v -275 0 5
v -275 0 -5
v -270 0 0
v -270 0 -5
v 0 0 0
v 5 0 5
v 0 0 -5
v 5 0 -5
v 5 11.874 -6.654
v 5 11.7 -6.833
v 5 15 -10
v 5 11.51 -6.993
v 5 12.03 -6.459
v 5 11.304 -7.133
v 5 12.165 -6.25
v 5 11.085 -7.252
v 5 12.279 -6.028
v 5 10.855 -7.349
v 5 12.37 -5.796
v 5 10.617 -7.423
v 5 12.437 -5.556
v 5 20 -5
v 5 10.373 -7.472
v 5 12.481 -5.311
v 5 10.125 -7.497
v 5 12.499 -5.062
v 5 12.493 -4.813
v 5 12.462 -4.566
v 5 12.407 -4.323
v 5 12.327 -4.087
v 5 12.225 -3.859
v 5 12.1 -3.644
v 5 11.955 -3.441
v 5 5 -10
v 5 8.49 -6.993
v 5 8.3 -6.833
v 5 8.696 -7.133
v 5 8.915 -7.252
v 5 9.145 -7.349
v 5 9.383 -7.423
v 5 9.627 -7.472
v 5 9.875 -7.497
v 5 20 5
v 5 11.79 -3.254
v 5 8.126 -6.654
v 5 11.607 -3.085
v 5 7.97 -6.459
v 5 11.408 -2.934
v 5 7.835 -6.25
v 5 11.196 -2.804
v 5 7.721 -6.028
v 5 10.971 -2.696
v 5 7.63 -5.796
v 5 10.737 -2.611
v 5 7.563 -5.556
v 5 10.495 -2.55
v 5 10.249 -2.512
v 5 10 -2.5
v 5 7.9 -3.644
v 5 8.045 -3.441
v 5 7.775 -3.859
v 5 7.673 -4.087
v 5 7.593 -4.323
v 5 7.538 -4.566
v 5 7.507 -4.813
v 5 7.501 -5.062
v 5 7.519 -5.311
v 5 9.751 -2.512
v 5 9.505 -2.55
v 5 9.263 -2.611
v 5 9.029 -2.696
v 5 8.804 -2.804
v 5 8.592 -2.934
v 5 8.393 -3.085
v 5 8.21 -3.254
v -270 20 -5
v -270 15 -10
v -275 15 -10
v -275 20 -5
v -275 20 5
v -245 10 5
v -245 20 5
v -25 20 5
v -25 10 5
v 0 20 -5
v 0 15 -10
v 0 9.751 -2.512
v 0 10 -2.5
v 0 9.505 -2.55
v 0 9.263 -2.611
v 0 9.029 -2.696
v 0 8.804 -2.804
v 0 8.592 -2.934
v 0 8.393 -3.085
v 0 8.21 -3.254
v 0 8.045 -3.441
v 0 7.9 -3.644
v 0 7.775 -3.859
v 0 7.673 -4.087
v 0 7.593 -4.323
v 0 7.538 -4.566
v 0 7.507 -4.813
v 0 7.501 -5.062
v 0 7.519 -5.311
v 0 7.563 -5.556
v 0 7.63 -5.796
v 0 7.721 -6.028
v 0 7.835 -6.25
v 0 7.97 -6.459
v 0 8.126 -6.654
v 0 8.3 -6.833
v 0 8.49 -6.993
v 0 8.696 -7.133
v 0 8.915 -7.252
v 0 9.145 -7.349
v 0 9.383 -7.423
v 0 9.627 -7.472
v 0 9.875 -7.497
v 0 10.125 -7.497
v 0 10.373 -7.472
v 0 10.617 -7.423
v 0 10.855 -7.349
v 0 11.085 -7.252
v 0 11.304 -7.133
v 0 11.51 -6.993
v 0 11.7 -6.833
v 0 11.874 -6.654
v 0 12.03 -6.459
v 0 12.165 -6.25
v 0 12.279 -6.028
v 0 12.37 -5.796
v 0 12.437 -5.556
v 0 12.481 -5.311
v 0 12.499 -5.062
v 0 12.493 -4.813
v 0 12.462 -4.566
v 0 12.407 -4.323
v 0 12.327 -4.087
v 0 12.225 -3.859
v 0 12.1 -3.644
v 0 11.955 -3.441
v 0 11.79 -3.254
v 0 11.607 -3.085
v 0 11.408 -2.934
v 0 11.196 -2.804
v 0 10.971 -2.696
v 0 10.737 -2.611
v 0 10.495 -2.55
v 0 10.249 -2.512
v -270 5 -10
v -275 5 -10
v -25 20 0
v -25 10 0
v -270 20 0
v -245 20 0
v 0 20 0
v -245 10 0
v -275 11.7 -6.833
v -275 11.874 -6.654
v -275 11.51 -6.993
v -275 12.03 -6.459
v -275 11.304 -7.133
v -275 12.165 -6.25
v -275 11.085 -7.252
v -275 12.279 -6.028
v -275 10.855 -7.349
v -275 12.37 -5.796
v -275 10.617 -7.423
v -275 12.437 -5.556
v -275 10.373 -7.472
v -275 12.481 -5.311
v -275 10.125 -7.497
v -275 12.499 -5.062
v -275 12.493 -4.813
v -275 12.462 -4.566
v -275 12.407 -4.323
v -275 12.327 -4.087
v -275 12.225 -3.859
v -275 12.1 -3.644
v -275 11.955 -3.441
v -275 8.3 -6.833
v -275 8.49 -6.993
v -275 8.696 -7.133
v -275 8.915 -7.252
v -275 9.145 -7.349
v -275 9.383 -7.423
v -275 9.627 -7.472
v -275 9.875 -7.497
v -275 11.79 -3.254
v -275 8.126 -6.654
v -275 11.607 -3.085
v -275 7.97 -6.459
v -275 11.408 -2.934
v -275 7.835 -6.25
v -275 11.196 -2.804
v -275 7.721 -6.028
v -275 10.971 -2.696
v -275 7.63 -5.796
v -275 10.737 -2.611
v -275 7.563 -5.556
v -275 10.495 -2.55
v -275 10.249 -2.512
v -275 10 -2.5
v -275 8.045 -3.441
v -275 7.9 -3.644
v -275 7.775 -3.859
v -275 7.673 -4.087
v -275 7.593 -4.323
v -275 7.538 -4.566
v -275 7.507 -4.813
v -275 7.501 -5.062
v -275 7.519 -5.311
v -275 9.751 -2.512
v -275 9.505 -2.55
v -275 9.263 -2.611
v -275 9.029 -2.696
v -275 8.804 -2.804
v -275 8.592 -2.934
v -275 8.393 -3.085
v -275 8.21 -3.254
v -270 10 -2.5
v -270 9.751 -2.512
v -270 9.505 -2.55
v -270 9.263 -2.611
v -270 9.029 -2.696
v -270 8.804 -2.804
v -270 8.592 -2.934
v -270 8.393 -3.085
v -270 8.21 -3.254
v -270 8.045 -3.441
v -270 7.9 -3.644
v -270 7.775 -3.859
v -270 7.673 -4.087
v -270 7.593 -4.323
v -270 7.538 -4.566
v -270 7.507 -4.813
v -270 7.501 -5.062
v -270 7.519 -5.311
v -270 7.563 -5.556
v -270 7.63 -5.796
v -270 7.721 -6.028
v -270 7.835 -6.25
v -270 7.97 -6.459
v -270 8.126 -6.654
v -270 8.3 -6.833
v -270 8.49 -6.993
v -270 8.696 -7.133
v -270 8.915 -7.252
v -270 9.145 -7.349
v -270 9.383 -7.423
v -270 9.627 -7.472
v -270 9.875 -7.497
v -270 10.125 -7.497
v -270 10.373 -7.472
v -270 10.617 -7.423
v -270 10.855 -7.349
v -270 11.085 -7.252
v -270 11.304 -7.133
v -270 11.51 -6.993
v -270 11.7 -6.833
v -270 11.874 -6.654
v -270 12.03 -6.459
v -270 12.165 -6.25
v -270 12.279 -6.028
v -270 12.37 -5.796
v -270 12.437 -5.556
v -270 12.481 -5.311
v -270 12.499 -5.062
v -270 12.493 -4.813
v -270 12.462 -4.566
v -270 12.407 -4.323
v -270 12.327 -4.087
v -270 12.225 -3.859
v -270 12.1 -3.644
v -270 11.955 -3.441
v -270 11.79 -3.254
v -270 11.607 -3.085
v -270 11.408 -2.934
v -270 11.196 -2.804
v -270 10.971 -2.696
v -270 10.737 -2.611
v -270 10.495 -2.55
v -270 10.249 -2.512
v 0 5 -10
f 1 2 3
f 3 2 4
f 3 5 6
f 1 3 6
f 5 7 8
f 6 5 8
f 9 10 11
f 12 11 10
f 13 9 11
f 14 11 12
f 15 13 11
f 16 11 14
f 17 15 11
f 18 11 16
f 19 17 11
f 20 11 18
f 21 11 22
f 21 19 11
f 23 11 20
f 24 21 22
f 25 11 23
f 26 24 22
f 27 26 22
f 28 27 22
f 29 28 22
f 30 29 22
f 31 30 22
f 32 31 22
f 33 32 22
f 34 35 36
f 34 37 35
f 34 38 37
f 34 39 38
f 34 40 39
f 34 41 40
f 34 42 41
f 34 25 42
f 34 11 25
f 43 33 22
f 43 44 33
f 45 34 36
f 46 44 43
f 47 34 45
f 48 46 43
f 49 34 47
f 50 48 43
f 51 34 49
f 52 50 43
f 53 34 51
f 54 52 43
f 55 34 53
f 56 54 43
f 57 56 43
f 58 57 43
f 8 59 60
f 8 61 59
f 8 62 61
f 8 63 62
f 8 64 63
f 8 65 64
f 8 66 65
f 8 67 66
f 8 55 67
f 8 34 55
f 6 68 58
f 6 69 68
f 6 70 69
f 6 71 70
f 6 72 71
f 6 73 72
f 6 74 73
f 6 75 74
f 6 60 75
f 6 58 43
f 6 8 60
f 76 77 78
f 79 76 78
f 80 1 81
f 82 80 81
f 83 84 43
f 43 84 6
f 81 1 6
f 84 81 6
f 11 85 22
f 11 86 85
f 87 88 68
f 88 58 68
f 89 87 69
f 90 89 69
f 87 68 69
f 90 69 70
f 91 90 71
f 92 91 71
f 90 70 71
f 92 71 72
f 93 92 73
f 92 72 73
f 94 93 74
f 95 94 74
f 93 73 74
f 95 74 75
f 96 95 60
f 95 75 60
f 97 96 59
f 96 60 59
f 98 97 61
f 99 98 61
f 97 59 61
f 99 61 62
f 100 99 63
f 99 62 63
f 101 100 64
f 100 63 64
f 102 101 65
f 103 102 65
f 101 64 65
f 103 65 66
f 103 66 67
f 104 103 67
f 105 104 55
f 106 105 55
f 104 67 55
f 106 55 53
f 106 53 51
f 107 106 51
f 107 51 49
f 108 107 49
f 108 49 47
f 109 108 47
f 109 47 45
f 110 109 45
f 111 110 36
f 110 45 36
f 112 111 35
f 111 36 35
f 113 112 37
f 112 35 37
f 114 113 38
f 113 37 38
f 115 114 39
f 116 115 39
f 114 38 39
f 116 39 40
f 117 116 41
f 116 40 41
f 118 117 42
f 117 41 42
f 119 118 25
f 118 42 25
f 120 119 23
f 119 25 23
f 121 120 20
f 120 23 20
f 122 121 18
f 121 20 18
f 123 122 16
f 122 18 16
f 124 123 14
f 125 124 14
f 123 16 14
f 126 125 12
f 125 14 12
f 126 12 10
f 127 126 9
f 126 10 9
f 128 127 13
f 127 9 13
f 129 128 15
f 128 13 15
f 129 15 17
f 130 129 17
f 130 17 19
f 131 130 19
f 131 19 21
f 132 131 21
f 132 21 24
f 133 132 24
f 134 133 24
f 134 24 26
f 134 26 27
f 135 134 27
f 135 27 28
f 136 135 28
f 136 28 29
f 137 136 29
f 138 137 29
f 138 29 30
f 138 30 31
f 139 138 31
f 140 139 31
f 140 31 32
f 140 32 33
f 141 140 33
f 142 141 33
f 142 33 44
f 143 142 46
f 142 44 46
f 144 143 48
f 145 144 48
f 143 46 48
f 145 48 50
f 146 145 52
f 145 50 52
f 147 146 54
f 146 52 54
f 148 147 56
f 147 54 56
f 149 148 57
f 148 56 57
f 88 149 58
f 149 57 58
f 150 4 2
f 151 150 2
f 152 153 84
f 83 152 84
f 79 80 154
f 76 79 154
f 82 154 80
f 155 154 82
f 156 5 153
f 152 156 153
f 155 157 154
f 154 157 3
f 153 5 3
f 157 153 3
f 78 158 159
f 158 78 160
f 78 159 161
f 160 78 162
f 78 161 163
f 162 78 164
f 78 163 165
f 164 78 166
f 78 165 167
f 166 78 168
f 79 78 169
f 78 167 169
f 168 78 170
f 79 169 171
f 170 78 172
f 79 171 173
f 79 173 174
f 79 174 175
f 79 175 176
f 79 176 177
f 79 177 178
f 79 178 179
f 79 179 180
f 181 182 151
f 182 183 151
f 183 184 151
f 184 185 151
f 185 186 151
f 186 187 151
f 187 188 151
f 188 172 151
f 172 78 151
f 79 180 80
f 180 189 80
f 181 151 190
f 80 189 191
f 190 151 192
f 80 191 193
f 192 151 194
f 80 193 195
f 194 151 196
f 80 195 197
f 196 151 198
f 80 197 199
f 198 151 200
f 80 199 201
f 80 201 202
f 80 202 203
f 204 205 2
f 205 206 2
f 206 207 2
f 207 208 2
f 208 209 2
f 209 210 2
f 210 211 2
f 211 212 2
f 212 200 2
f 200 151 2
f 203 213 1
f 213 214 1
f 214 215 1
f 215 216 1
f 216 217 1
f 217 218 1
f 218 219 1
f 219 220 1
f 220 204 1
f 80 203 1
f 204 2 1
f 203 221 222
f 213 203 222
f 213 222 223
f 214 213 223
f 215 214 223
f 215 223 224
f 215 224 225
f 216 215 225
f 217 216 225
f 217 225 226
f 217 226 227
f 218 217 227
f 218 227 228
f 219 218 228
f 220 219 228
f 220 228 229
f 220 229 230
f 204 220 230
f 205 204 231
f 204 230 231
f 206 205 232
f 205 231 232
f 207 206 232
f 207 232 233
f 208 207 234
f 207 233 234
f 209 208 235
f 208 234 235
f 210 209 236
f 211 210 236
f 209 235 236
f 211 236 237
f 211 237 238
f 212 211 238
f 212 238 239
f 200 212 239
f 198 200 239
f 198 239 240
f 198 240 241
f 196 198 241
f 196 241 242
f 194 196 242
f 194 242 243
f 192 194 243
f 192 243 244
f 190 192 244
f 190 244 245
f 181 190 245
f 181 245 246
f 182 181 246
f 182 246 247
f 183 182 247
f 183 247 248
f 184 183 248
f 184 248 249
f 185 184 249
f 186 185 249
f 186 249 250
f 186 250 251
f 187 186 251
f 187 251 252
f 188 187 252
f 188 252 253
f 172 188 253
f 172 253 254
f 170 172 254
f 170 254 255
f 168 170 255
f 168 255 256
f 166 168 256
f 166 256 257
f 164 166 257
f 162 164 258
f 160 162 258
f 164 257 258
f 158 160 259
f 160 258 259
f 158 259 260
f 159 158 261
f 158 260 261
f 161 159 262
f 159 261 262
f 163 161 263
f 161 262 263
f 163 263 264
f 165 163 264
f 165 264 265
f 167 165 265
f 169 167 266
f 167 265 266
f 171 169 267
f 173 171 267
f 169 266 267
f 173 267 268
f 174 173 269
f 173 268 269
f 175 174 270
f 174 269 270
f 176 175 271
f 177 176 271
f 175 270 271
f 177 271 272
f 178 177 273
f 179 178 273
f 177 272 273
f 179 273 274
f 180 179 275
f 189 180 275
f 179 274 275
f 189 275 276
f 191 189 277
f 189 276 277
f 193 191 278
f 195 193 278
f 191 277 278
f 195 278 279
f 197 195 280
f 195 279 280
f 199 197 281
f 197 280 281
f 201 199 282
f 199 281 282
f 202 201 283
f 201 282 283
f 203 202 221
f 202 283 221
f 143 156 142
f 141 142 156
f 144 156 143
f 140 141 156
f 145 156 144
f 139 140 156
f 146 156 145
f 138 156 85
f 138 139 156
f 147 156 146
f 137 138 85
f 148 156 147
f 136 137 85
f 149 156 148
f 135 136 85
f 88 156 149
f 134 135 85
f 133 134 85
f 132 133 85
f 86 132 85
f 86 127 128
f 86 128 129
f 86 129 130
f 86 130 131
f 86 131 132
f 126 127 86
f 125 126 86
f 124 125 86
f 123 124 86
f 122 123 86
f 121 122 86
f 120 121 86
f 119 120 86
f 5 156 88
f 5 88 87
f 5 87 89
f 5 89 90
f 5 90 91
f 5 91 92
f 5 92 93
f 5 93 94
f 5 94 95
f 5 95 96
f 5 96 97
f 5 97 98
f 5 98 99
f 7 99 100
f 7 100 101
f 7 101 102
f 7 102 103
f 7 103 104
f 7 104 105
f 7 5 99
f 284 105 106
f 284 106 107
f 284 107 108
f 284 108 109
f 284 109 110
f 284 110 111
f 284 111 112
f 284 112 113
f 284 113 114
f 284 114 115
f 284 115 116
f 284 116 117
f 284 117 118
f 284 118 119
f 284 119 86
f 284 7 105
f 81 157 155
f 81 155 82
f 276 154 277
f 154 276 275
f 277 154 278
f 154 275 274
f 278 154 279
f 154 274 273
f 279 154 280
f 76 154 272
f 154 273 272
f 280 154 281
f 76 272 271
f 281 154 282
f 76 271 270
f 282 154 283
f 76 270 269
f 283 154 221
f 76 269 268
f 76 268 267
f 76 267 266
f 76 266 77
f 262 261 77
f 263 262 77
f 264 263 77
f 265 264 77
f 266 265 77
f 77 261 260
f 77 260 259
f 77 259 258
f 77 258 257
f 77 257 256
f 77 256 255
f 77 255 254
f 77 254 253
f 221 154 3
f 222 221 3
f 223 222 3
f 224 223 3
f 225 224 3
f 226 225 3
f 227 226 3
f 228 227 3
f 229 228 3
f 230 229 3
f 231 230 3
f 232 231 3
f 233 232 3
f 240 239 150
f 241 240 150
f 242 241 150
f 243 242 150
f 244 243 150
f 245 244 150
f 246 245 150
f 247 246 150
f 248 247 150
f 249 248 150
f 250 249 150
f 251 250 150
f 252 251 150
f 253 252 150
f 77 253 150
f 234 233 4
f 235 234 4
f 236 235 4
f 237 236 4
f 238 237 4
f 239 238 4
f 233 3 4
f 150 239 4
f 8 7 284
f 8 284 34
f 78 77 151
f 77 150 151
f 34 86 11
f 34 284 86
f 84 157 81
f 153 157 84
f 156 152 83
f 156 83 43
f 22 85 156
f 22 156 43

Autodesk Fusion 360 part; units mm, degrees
sketch "Sketch1" plane through (0, 0, 0) normal (0, 1, 0) x (1, 0, 0)
  line L0 (0, 0) -> (-25, 0)
  line L1 (-25, 0) -> (-25, -5)
  line L2 (-25, -5) -> (5, -5)
  line L3 (0, 0) -> (0, 10)
  line L4 (0, 10) -> (5, 10)
  line L5 (5, 10) -> (5, -5)
  line L6 (-25, 0) -> (-245, 0)
  line L7 (-245, 0) -> (-245, -5)
  line L8 (-245, -5) -> (-25, -5)
  line L9 (-25, 0) -> (-140, 0)
  line L10 (-140, 0) -> (-140, 27.0089)
  line L11 (-270, 10) -> (-275, 10)
  line L12 (-270, 0) -> (-270, 10)
  line L13 (-275, 10) -> (-275, -5)
  line L14 (-270, 0) -> (-245, 0)
  line L15 (-245, -5) -> (-275, -5)
  line L16 (-245, 0) -> (-245, -5)
  point P0 (-270, 0)
  dimension "d1" = 25
  dimension "d2" = 5
  dimension "d3" = 30
  dimension "d4" = 10
  dimension "d5" = 5
  dimension "d6" = 220
  dimension "d7" = 5
  dimension "d8" = 115
extrude "Extrude1" add sketch "Sketch1" along normal blind 10
extrude "Extrude2" add sketch "Sketch1" along normal blind 20 contours L0 L1 L2 L3 L4 L5 | L7 L11 L12 L13 L14 L15 L16
sketch "Sketch2" plane through (5, 0, 0) normal (1, 0, 0) x (0, 0, -1)
  line L0 (-5, 0) -> (10, 0)
  line L1 (10, 0) -> (10, 20)
  line L2 (10, 20) -> (-5, 20)
  line L3 (-5, 20) -> (-5, 0)
sketch "Sketch3" plane through (0, 0, 0) normal (-1, 0, 0) x (0, 0, 1)
  line L0 (-10, 0) -> (0, 0)
  line L1 (0, 0) -> (0, 20)
  line L2 (0, 20) -> (-10, 20)
  line L3 (-10, 20) -> (-10, 0)
  line L4 (-10, 0) -> (-5, 0)
  line L5 (-5, 0) -> (-5, 10)
  circle A0 centre (-5, 10) radius 2.5
  dimension "d13" = 5
  dimension "d14" = 10
  dimension "d15" = 5
extrude "Extrude3" cut sketch "Sketch3" along normal mid plane 662 contours A0
chamfer "Chamfer1" distance 5 angle 45 4 edges at (2.5, 20, -10) (2.5, 0, -10) (-272.5, 20, -10) (-272.5, 0, -10)
